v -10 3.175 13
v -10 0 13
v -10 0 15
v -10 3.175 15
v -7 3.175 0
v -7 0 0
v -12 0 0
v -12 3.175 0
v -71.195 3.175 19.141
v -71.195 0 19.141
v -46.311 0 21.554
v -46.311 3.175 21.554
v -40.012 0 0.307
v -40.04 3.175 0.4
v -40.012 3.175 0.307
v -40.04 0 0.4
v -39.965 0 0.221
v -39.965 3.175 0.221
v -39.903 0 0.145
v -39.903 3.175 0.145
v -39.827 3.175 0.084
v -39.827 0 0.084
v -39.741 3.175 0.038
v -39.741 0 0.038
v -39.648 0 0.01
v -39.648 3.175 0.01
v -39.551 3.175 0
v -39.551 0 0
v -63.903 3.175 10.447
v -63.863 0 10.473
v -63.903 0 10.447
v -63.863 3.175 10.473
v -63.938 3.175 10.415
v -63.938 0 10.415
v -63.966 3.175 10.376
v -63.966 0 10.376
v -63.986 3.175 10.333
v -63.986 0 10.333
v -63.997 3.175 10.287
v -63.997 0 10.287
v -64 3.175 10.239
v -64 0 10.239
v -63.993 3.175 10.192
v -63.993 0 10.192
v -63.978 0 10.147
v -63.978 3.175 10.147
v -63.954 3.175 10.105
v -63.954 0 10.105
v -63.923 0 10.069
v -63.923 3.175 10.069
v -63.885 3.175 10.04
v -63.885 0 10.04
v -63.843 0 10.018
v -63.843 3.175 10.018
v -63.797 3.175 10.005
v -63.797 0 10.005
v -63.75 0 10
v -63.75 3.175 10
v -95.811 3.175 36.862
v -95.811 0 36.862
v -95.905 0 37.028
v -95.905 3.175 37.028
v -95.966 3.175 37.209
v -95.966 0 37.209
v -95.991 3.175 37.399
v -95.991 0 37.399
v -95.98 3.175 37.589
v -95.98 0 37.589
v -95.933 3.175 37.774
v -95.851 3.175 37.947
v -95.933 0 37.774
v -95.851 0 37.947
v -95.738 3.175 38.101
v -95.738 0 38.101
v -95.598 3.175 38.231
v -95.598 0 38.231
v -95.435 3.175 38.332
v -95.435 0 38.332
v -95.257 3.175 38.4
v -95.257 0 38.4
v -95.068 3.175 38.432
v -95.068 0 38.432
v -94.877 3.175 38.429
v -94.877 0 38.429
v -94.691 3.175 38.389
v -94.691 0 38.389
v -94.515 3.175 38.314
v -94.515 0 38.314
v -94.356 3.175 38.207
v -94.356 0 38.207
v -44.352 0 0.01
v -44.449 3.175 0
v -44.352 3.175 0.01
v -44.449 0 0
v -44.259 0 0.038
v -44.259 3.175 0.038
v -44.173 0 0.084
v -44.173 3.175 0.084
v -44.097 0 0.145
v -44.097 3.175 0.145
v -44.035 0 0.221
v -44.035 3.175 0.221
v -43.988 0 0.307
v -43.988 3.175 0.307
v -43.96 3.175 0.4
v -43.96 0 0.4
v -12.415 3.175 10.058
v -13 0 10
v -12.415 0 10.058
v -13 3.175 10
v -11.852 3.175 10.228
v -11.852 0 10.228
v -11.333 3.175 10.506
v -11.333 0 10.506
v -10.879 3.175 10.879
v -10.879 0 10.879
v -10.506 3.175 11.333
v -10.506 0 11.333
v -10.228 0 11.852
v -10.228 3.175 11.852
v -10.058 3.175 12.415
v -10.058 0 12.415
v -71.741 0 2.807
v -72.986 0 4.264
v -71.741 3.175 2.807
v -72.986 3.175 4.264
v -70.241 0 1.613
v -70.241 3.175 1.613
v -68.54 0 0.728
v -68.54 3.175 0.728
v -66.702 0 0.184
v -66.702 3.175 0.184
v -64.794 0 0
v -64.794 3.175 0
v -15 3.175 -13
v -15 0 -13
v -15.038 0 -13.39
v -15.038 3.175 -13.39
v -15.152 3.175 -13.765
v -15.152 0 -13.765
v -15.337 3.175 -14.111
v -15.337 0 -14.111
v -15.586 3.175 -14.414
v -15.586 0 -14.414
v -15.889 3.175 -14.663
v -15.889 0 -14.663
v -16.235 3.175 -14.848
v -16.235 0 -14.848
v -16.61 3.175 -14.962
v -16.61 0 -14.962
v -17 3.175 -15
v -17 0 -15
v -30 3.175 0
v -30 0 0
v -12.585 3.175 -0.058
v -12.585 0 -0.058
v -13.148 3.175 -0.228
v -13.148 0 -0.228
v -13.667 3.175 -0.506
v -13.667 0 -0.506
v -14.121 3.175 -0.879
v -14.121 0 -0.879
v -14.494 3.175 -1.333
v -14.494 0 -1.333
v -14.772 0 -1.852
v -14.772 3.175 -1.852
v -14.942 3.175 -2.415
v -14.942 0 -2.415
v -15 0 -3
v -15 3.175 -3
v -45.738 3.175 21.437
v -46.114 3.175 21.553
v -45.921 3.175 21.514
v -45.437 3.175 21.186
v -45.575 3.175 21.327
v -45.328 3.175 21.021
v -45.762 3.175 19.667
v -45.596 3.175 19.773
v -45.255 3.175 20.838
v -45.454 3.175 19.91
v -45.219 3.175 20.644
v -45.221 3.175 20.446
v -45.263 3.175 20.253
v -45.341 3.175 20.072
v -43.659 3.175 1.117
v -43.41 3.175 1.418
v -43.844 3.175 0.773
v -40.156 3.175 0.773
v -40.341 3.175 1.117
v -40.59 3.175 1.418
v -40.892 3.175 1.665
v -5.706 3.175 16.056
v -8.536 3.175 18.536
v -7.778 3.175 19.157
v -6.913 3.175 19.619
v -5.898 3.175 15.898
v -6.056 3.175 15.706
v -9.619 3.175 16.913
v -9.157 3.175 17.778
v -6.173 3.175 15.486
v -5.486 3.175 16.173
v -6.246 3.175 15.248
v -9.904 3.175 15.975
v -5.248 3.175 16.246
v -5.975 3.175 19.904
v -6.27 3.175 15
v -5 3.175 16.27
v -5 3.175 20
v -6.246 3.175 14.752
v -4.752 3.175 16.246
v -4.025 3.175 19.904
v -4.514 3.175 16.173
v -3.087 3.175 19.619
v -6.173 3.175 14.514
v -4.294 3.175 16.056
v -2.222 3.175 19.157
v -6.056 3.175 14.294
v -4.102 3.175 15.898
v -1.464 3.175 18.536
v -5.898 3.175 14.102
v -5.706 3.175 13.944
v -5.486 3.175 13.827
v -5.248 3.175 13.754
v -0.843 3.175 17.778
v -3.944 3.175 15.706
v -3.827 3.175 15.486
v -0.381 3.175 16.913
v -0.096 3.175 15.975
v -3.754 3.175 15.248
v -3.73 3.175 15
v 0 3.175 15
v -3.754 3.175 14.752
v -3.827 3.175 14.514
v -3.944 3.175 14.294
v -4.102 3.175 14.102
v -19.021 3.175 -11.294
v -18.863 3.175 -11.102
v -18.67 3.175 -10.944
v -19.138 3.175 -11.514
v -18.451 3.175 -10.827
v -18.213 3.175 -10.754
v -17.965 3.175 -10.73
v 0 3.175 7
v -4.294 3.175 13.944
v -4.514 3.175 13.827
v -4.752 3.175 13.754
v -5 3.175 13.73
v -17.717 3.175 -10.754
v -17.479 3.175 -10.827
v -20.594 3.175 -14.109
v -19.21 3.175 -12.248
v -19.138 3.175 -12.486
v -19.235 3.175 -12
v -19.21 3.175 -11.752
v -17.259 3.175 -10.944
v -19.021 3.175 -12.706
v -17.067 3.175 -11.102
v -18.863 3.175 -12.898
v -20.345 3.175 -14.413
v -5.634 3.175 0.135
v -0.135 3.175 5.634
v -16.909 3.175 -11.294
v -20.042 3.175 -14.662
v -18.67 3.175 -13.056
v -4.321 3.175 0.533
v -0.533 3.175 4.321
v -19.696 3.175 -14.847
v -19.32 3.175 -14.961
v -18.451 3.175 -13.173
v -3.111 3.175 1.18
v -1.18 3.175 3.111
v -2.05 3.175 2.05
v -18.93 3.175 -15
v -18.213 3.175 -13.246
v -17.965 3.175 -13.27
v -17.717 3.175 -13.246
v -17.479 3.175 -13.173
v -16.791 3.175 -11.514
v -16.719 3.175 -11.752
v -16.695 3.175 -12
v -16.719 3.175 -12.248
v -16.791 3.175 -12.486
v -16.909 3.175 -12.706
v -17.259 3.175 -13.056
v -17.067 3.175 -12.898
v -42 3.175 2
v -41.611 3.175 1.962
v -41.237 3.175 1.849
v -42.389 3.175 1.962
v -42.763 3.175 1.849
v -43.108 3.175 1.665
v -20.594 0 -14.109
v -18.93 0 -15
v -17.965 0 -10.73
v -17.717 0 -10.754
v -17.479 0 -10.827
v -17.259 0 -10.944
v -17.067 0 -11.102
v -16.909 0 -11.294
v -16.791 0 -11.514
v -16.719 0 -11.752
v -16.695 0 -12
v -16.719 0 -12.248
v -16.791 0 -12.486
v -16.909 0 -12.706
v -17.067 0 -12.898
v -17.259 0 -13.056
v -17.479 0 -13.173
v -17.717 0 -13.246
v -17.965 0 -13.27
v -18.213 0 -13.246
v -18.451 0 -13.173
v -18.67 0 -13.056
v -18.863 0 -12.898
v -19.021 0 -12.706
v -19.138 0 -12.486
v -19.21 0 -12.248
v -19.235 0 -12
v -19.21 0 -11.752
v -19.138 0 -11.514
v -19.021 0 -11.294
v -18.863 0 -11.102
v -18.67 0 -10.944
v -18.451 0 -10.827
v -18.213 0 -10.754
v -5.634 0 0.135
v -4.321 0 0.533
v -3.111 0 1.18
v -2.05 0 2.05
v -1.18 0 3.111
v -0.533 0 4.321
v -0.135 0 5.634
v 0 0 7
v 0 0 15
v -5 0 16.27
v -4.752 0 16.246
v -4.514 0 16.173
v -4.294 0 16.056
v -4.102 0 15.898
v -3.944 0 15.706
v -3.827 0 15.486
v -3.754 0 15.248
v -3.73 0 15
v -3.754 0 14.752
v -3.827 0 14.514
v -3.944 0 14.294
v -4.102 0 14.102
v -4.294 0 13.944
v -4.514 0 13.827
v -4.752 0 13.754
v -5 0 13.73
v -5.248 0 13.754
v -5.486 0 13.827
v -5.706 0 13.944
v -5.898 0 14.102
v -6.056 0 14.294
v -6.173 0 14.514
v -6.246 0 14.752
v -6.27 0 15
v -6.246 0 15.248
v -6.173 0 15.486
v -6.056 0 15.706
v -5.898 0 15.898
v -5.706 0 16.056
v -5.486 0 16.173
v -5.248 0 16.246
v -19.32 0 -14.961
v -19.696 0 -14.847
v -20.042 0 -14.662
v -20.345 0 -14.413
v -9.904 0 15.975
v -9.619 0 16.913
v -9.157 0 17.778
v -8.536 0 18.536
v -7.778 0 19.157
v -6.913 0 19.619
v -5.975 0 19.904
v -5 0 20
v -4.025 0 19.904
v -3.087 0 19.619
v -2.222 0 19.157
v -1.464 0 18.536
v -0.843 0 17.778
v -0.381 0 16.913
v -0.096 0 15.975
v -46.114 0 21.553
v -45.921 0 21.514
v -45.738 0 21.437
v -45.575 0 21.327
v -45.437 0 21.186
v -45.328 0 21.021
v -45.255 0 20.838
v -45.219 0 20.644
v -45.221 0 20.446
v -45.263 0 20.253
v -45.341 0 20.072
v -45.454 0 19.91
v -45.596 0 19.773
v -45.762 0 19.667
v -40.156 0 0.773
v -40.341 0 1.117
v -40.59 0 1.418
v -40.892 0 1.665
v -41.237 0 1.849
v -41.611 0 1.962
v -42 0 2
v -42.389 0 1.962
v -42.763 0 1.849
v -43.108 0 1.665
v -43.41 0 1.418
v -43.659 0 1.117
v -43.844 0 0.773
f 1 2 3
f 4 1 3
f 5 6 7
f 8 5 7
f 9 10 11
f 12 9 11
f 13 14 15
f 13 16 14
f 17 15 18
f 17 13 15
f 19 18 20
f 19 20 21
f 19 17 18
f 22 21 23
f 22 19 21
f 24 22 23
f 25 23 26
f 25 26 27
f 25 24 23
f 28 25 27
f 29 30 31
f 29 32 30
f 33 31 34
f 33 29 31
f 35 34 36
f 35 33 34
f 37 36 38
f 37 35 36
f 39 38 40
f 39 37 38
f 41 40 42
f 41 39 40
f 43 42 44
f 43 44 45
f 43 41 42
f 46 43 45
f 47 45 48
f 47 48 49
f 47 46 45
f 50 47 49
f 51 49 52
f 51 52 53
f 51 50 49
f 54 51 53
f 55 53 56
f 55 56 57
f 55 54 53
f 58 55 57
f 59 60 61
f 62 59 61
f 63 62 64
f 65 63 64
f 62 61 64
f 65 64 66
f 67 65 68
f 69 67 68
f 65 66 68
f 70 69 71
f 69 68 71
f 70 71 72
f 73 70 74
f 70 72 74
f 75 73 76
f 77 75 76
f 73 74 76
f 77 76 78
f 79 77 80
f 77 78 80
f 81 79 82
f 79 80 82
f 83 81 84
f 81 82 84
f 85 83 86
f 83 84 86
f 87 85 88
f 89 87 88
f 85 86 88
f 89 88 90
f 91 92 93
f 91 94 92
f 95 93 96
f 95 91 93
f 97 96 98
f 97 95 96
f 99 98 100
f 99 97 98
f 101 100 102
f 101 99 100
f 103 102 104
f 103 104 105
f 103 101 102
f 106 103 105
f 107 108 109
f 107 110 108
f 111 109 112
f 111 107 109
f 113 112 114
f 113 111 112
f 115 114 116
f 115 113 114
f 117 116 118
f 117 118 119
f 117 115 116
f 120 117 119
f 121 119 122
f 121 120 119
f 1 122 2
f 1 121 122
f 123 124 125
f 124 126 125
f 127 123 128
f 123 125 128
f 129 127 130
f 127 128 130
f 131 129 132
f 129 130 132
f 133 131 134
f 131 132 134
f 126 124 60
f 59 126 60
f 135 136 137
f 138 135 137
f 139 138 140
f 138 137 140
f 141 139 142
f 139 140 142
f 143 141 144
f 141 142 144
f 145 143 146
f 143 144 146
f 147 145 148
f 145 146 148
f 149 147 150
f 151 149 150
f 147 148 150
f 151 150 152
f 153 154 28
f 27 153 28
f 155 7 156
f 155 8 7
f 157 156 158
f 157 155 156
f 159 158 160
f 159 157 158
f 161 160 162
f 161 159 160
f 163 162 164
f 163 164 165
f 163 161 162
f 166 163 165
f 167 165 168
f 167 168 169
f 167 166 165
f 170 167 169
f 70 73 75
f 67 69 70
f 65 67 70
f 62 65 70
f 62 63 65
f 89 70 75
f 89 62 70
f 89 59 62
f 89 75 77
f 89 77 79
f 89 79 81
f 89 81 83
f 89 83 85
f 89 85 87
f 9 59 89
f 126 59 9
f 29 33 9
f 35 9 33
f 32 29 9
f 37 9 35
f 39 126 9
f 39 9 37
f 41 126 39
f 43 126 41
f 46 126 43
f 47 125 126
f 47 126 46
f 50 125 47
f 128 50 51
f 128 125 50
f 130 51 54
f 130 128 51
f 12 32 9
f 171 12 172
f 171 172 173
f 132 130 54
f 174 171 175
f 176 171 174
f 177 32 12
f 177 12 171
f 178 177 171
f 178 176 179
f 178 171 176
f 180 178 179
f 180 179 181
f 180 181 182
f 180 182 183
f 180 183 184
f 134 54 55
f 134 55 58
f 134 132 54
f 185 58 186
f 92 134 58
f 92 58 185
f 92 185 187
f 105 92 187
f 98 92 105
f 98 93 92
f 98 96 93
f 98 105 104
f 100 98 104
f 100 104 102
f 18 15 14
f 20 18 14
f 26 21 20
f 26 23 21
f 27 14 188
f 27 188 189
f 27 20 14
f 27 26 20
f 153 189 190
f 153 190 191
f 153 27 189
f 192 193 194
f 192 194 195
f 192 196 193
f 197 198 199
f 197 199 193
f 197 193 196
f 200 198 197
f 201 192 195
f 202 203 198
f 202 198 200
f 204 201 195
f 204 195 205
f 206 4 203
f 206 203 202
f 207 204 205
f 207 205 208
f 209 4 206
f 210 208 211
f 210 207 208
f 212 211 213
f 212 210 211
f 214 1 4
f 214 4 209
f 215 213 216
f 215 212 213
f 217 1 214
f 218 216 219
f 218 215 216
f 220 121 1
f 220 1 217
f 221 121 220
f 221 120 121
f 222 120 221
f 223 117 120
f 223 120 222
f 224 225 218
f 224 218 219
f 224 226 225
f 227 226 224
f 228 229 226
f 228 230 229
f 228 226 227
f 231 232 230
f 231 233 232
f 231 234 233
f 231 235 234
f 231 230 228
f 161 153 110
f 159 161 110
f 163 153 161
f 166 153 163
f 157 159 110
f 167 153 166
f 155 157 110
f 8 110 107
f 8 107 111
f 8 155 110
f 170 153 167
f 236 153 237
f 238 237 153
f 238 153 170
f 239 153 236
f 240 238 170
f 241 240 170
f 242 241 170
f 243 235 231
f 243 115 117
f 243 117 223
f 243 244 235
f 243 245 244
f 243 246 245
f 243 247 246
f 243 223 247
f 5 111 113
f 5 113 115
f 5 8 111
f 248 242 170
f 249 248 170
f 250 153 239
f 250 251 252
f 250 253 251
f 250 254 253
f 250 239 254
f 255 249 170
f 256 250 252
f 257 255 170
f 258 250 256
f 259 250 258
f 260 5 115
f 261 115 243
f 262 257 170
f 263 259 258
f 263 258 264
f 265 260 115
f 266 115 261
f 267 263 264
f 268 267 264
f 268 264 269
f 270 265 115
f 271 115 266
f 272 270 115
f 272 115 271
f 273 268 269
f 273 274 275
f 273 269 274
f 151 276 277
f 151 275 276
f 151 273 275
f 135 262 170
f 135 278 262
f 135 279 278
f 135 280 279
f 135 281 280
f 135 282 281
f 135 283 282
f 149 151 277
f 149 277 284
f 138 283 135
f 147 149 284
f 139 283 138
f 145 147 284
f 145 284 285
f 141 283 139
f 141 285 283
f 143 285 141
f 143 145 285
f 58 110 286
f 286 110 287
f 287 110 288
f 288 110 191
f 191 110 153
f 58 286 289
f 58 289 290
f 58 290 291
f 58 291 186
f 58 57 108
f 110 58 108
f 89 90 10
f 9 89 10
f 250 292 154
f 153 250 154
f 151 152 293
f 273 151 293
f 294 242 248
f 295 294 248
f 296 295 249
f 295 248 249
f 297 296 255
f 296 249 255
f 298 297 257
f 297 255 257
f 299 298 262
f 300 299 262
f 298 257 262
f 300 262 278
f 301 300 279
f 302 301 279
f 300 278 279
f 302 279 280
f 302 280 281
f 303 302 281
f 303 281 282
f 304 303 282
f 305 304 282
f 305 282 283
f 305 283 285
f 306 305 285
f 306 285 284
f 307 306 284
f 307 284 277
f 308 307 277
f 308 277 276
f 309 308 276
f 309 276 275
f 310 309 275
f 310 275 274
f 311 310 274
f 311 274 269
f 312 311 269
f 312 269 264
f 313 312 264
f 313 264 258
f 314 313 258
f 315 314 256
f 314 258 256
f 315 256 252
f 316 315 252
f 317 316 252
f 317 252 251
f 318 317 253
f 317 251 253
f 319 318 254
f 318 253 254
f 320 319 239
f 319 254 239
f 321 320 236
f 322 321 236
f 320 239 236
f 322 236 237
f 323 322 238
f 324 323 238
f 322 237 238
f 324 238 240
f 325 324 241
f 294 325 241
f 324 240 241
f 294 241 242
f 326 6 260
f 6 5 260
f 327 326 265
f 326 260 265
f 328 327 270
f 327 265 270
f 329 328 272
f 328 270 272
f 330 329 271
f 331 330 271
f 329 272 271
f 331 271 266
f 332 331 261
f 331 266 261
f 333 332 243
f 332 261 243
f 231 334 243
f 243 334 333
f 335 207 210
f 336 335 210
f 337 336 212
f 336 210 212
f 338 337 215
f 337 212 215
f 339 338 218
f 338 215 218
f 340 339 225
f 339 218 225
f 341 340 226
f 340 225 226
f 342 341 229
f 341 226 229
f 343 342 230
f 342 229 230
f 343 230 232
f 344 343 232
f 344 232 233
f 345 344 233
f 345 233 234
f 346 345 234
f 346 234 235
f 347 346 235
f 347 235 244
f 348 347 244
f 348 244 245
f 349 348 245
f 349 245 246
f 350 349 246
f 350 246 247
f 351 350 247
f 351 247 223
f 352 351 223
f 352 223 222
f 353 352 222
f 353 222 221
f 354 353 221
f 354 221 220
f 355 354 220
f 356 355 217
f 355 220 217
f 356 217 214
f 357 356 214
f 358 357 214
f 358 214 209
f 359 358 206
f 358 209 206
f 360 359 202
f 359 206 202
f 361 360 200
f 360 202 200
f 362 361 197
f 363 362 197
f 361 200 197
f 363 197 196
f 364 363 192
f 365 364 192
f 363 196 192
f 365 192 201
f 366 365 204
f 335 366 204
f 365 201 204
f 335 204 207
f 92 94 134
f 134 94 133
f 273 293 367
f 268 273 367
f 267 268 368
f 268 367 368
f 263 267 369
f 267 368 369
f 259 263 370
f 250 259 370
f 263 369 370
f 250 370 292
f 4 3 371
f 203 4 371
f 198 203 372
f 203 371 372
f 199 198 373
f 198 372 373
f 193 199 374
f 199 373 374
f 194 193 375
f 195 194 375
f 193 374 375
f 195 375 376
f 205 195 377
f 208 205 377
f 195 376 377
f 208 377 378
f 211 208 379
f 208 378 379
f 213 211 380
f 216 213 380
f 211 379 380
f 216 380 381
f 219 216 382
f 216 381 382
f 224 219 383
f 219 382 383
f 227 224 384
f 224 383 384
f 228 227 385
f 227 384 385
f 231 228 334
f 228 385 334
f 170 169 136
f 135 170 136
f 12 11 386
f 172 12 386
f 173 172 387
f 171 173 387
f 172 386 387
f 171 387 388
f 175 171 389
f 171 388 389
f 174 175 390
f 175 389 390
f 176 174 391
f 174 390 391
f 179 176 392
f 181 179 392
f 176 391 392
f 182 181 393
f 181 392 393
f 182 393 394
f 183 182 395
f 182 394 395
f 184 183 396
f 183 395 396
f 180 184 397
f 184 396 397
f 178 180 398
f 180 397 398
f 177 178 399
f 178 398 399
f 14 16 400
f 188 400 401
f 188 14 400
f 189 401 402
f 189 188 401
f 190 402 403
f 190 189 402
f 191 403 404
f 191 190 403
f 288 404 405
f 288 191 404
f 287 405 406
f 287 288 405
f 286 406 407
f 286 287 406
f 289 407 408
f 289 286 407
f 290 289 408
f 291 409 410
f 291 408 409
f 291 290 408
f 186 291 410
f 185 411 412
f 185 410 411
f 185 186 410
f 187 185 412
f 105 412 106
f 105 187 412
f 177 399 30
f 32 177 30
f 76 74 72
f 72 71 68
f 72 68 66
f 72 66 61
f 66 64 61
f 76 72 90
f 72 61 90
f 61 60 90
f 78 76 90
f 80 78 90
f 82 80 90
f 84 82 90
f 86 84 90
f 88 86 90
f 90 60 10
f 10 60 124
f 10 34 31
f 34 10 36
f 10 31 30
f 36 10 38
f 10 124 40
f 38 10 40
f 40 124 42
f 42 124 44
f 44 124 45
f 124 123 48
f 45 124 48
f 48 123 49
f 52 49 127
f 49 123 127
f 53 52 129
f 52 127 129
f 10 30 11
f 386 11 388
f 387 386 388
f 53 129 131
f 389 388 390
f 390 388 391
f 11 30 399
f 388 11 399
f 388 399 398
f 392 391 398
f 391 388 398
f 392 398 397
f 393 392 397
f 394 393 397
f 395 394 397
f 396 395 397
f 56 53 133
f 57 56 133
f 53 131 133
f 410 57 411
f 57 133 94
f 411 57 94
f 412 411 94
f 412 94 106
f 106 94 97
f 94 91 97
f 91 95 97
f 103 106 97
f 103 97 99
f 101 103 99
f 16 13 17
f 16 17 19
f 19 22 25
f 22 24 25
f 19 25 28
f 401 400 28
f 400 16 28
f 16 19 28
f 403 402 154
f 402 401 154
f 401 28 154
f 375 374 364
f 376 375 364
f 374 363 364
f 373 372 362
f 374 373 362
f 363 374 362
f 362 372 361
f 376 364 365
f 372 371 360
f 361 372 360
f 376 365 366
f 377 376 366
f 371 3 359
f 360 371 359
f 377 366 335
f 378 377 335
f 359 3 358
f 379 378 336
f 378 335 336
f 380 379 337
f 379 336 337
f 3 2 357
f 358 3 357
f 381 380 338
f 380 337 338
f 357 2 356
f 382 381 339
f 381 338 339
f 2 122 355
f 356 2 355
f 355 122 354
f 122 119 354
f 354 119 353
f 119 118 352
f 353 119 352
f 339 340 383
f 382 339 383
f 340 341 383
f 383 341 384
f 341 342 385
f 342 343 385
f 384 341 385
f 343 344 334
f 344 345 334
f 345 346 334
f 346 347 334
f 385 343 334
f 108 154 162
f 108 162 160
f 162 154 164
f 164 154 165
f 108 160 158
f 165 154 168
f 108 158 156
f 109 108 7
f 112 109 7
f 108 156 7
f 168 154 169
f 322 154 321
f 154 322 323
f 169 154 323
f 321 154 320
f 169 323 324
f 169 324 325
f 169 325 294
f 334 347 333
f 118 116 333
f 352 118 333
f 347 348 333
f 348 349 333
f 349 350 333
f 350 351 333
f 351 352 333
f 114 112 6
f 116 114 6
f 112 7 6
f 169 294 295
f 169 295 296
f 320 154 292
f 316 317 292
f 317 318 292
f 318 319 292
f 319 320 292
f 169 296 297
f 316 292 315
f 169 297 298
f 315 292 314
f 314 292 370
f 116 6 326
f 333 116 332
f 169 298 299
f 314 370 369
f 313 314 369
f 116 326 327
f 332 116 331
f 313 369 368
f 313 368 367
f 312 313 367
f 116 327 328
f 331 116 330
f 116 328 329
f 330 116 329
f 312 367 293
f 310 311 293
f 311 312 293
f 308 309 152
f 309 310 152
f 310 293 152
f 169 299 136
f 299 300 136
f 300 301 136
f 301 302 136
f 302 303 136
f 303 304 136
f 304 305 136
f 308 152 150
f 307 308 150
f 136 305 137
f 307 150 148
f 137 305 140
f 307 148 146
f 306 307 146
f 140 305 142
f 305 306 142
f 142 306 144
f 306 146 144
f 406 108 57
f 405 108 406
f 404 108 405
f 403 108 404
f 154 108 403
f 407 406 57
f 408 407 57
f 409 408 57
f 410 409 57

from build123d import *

# Parameters (mm, degrees)
BOSS_EXTRUDE1_DEPTH = 3.175
CUT_EXTRUDE1_REACH  = 105.449
SKETCH2_R           = 1.27
CUT_EXTRUDE2_DEPTH  = 104.449433541
FILLET1_R           = 10
FILLET2_R           = 0.25
FILLET3_R           = 3
FILLET4_R           = 0.5
FILLET5_R           = 7
FILLET6_R           = 3


with BuildPart() as part:
    # Sketch1 → Boss-Extrude1 (new body)
    with BuildSketch(Plane(origin=(0, 0, 0), x_dir=(1, 0, 0), z_dir=(0, 1, 0))):
        with BuildLine():
            Line((-30, 0), (-70, 0))
            Line((-70, 0), (-95.810939636, -36.861841993))
            ThreePointArc((-95.810939636, -36.861841993), (-95.670834686, -38.169513139), (-94.356227321, -38.207469686))
            Line((-94.356227321, -38.207469686), (-71.194689629, -19.140661569))
            Line((-71.194689629, -19.140661569), (-46.31139823, -21.55350411))
            ThreePointArc((-46.31139823, -21.55350411), (-45.254748427, -20.8377054), (-45.762041851, -19.666582016))
            Line((-45.762041851, -19.666582016), (-64.794329494, -10))
            Line((-64.794329494, -10), (-10, -10))
            Line((-10, -10), (-10, -15))
            ThreePointArc((-10, -15), (-5, -20), (0, -15))
            Line((0, -15), (0, 0))
            Line((0, 0), (-15, 0))
            Line((-15, 0), (-15, 13))
            ThreePointArc((-15, 13), (-15.585786438, 14.414213562), (-17, 15))
            Line((-17, 15), (-18.929632483, 15))
            ThreePointArc((-18.929632483, 15), (-19.873348334, 14.763349198), (-20.593733072, 14.109400392))
            Line((-20.593733072, 14.109400392), (-30, 0))
        make_face()
    extrude(amount=BOSS_EXTRUDE1_DEPTH)

    # Sketch2 → Cut-Extrude1 (cut, up to next)
    with BuildSketch(Plane(origin=(0, 3.175, 0), x_dir=(1, 0, 0), z_dir=(0, 1, 0)), mode=Mode.PRIVATE) as cut_extrude1_sk1:
        with Locations(Location((-5, -15, 0), (0, 0, 270))):
            Circle(SKETCH2_R)
    cut_extrude1_tool1 = extrude(cut_extrude1_sk1.sketch, amount=-CUT_EXTRUDE1_REACH, mode=Mode.PRIVATE) & part.part
    # Sketch2 → Cut-Extrude1 (cut, up to next)
    with BuildSketch(Plane(origin=(0, 3.175, 0), x_dir=(1, 0, 0), z_dir=(0, 1, 0)), mode=Mode.PRIVATE) as cut_extrude1_sk2:
        with Locations(Location((-17.964816242, 12, 0), (0, 0, 270))):
            Circle(SKETCH2_R)
    cut_extrude1_tool2 = extrude(cut_extrude1_sk2.sketch, amount=-CUT_EXTRUDE1_REACH, mode=Mode.PRIVATE) & part.part
    add(cut_extrude1_tool1.solids().sort_by_distance((-5, 3.175, 15))[0], mode=Mode.SUBTRACT)
    add(cut_extrude1_tool2.solids().sort_by_distance((-17.964816, 3.175, -12))[0], mode=Mode.SUBTRACT)

    # Sketch3 → Cut-Extrude2 (cut, through all)
    with BuildSketch(Plane(origin=(0, 3.175, 0), x_dir=(1, 0, 0), z_dir=(0, 1, 0))):
        with BuildLine():
            Line((-44, 0), (-40, 0))
            ThreePointArc((-40, 0), (-42, -2), (-44, 0))
        make_face()
    extrude(amount=-CUT_EXTRUDE2_DEPTH, mode=Mode.SUBTRACT)

    # Fillet1
    fillet1_edges = [part.edges().sort_by_distance(p)[0] for p in [
        (-70, 1.5875, 0),
    ]]
    fillet(fillet1_edges, radius=FILLET1_R)

    # Fillet2
    fillet2_edges = [part.edges().sort_by_distance(p)[0] for p in [
        (-64.794329494, 1.5875, 10),
    ]]
    fillet(fillet2_edges, radius=FILLET2_R)

    # Fillet3
    fillet3_edges = [part.edges().sort_by_distance(p)[0] for p in [
        (-10, 1.5875, 10),
    ]]
    fillet(fillet3_edges, radius=FILLET3_R)

    # Fillet4
    fillet4_edges = [part.edges().sort_by_distance(p)[0] for p in [
        (-40, 1.5875, 0),
        (-44, 1.5875, 0),
    ]]
    fillet(fillet4_edges, radius=FILLET4_R)

    # Fillet5
    fillet5_edges = [part.edges().sort_by_distance(p)[0] for p in [
        (0, 1.5875, 0),
    ]]
    fillet(fillet5_edges, radius=FILLET5_R)

    # Fillet6
    fillet6_edges = [part.edges().sort_by_distance(p)[0] for p in [
        (-15, 1.5875, 0),
    ]]
    fillet(fillet6_edges, radius=FILLET6_R)


solid = part.part
